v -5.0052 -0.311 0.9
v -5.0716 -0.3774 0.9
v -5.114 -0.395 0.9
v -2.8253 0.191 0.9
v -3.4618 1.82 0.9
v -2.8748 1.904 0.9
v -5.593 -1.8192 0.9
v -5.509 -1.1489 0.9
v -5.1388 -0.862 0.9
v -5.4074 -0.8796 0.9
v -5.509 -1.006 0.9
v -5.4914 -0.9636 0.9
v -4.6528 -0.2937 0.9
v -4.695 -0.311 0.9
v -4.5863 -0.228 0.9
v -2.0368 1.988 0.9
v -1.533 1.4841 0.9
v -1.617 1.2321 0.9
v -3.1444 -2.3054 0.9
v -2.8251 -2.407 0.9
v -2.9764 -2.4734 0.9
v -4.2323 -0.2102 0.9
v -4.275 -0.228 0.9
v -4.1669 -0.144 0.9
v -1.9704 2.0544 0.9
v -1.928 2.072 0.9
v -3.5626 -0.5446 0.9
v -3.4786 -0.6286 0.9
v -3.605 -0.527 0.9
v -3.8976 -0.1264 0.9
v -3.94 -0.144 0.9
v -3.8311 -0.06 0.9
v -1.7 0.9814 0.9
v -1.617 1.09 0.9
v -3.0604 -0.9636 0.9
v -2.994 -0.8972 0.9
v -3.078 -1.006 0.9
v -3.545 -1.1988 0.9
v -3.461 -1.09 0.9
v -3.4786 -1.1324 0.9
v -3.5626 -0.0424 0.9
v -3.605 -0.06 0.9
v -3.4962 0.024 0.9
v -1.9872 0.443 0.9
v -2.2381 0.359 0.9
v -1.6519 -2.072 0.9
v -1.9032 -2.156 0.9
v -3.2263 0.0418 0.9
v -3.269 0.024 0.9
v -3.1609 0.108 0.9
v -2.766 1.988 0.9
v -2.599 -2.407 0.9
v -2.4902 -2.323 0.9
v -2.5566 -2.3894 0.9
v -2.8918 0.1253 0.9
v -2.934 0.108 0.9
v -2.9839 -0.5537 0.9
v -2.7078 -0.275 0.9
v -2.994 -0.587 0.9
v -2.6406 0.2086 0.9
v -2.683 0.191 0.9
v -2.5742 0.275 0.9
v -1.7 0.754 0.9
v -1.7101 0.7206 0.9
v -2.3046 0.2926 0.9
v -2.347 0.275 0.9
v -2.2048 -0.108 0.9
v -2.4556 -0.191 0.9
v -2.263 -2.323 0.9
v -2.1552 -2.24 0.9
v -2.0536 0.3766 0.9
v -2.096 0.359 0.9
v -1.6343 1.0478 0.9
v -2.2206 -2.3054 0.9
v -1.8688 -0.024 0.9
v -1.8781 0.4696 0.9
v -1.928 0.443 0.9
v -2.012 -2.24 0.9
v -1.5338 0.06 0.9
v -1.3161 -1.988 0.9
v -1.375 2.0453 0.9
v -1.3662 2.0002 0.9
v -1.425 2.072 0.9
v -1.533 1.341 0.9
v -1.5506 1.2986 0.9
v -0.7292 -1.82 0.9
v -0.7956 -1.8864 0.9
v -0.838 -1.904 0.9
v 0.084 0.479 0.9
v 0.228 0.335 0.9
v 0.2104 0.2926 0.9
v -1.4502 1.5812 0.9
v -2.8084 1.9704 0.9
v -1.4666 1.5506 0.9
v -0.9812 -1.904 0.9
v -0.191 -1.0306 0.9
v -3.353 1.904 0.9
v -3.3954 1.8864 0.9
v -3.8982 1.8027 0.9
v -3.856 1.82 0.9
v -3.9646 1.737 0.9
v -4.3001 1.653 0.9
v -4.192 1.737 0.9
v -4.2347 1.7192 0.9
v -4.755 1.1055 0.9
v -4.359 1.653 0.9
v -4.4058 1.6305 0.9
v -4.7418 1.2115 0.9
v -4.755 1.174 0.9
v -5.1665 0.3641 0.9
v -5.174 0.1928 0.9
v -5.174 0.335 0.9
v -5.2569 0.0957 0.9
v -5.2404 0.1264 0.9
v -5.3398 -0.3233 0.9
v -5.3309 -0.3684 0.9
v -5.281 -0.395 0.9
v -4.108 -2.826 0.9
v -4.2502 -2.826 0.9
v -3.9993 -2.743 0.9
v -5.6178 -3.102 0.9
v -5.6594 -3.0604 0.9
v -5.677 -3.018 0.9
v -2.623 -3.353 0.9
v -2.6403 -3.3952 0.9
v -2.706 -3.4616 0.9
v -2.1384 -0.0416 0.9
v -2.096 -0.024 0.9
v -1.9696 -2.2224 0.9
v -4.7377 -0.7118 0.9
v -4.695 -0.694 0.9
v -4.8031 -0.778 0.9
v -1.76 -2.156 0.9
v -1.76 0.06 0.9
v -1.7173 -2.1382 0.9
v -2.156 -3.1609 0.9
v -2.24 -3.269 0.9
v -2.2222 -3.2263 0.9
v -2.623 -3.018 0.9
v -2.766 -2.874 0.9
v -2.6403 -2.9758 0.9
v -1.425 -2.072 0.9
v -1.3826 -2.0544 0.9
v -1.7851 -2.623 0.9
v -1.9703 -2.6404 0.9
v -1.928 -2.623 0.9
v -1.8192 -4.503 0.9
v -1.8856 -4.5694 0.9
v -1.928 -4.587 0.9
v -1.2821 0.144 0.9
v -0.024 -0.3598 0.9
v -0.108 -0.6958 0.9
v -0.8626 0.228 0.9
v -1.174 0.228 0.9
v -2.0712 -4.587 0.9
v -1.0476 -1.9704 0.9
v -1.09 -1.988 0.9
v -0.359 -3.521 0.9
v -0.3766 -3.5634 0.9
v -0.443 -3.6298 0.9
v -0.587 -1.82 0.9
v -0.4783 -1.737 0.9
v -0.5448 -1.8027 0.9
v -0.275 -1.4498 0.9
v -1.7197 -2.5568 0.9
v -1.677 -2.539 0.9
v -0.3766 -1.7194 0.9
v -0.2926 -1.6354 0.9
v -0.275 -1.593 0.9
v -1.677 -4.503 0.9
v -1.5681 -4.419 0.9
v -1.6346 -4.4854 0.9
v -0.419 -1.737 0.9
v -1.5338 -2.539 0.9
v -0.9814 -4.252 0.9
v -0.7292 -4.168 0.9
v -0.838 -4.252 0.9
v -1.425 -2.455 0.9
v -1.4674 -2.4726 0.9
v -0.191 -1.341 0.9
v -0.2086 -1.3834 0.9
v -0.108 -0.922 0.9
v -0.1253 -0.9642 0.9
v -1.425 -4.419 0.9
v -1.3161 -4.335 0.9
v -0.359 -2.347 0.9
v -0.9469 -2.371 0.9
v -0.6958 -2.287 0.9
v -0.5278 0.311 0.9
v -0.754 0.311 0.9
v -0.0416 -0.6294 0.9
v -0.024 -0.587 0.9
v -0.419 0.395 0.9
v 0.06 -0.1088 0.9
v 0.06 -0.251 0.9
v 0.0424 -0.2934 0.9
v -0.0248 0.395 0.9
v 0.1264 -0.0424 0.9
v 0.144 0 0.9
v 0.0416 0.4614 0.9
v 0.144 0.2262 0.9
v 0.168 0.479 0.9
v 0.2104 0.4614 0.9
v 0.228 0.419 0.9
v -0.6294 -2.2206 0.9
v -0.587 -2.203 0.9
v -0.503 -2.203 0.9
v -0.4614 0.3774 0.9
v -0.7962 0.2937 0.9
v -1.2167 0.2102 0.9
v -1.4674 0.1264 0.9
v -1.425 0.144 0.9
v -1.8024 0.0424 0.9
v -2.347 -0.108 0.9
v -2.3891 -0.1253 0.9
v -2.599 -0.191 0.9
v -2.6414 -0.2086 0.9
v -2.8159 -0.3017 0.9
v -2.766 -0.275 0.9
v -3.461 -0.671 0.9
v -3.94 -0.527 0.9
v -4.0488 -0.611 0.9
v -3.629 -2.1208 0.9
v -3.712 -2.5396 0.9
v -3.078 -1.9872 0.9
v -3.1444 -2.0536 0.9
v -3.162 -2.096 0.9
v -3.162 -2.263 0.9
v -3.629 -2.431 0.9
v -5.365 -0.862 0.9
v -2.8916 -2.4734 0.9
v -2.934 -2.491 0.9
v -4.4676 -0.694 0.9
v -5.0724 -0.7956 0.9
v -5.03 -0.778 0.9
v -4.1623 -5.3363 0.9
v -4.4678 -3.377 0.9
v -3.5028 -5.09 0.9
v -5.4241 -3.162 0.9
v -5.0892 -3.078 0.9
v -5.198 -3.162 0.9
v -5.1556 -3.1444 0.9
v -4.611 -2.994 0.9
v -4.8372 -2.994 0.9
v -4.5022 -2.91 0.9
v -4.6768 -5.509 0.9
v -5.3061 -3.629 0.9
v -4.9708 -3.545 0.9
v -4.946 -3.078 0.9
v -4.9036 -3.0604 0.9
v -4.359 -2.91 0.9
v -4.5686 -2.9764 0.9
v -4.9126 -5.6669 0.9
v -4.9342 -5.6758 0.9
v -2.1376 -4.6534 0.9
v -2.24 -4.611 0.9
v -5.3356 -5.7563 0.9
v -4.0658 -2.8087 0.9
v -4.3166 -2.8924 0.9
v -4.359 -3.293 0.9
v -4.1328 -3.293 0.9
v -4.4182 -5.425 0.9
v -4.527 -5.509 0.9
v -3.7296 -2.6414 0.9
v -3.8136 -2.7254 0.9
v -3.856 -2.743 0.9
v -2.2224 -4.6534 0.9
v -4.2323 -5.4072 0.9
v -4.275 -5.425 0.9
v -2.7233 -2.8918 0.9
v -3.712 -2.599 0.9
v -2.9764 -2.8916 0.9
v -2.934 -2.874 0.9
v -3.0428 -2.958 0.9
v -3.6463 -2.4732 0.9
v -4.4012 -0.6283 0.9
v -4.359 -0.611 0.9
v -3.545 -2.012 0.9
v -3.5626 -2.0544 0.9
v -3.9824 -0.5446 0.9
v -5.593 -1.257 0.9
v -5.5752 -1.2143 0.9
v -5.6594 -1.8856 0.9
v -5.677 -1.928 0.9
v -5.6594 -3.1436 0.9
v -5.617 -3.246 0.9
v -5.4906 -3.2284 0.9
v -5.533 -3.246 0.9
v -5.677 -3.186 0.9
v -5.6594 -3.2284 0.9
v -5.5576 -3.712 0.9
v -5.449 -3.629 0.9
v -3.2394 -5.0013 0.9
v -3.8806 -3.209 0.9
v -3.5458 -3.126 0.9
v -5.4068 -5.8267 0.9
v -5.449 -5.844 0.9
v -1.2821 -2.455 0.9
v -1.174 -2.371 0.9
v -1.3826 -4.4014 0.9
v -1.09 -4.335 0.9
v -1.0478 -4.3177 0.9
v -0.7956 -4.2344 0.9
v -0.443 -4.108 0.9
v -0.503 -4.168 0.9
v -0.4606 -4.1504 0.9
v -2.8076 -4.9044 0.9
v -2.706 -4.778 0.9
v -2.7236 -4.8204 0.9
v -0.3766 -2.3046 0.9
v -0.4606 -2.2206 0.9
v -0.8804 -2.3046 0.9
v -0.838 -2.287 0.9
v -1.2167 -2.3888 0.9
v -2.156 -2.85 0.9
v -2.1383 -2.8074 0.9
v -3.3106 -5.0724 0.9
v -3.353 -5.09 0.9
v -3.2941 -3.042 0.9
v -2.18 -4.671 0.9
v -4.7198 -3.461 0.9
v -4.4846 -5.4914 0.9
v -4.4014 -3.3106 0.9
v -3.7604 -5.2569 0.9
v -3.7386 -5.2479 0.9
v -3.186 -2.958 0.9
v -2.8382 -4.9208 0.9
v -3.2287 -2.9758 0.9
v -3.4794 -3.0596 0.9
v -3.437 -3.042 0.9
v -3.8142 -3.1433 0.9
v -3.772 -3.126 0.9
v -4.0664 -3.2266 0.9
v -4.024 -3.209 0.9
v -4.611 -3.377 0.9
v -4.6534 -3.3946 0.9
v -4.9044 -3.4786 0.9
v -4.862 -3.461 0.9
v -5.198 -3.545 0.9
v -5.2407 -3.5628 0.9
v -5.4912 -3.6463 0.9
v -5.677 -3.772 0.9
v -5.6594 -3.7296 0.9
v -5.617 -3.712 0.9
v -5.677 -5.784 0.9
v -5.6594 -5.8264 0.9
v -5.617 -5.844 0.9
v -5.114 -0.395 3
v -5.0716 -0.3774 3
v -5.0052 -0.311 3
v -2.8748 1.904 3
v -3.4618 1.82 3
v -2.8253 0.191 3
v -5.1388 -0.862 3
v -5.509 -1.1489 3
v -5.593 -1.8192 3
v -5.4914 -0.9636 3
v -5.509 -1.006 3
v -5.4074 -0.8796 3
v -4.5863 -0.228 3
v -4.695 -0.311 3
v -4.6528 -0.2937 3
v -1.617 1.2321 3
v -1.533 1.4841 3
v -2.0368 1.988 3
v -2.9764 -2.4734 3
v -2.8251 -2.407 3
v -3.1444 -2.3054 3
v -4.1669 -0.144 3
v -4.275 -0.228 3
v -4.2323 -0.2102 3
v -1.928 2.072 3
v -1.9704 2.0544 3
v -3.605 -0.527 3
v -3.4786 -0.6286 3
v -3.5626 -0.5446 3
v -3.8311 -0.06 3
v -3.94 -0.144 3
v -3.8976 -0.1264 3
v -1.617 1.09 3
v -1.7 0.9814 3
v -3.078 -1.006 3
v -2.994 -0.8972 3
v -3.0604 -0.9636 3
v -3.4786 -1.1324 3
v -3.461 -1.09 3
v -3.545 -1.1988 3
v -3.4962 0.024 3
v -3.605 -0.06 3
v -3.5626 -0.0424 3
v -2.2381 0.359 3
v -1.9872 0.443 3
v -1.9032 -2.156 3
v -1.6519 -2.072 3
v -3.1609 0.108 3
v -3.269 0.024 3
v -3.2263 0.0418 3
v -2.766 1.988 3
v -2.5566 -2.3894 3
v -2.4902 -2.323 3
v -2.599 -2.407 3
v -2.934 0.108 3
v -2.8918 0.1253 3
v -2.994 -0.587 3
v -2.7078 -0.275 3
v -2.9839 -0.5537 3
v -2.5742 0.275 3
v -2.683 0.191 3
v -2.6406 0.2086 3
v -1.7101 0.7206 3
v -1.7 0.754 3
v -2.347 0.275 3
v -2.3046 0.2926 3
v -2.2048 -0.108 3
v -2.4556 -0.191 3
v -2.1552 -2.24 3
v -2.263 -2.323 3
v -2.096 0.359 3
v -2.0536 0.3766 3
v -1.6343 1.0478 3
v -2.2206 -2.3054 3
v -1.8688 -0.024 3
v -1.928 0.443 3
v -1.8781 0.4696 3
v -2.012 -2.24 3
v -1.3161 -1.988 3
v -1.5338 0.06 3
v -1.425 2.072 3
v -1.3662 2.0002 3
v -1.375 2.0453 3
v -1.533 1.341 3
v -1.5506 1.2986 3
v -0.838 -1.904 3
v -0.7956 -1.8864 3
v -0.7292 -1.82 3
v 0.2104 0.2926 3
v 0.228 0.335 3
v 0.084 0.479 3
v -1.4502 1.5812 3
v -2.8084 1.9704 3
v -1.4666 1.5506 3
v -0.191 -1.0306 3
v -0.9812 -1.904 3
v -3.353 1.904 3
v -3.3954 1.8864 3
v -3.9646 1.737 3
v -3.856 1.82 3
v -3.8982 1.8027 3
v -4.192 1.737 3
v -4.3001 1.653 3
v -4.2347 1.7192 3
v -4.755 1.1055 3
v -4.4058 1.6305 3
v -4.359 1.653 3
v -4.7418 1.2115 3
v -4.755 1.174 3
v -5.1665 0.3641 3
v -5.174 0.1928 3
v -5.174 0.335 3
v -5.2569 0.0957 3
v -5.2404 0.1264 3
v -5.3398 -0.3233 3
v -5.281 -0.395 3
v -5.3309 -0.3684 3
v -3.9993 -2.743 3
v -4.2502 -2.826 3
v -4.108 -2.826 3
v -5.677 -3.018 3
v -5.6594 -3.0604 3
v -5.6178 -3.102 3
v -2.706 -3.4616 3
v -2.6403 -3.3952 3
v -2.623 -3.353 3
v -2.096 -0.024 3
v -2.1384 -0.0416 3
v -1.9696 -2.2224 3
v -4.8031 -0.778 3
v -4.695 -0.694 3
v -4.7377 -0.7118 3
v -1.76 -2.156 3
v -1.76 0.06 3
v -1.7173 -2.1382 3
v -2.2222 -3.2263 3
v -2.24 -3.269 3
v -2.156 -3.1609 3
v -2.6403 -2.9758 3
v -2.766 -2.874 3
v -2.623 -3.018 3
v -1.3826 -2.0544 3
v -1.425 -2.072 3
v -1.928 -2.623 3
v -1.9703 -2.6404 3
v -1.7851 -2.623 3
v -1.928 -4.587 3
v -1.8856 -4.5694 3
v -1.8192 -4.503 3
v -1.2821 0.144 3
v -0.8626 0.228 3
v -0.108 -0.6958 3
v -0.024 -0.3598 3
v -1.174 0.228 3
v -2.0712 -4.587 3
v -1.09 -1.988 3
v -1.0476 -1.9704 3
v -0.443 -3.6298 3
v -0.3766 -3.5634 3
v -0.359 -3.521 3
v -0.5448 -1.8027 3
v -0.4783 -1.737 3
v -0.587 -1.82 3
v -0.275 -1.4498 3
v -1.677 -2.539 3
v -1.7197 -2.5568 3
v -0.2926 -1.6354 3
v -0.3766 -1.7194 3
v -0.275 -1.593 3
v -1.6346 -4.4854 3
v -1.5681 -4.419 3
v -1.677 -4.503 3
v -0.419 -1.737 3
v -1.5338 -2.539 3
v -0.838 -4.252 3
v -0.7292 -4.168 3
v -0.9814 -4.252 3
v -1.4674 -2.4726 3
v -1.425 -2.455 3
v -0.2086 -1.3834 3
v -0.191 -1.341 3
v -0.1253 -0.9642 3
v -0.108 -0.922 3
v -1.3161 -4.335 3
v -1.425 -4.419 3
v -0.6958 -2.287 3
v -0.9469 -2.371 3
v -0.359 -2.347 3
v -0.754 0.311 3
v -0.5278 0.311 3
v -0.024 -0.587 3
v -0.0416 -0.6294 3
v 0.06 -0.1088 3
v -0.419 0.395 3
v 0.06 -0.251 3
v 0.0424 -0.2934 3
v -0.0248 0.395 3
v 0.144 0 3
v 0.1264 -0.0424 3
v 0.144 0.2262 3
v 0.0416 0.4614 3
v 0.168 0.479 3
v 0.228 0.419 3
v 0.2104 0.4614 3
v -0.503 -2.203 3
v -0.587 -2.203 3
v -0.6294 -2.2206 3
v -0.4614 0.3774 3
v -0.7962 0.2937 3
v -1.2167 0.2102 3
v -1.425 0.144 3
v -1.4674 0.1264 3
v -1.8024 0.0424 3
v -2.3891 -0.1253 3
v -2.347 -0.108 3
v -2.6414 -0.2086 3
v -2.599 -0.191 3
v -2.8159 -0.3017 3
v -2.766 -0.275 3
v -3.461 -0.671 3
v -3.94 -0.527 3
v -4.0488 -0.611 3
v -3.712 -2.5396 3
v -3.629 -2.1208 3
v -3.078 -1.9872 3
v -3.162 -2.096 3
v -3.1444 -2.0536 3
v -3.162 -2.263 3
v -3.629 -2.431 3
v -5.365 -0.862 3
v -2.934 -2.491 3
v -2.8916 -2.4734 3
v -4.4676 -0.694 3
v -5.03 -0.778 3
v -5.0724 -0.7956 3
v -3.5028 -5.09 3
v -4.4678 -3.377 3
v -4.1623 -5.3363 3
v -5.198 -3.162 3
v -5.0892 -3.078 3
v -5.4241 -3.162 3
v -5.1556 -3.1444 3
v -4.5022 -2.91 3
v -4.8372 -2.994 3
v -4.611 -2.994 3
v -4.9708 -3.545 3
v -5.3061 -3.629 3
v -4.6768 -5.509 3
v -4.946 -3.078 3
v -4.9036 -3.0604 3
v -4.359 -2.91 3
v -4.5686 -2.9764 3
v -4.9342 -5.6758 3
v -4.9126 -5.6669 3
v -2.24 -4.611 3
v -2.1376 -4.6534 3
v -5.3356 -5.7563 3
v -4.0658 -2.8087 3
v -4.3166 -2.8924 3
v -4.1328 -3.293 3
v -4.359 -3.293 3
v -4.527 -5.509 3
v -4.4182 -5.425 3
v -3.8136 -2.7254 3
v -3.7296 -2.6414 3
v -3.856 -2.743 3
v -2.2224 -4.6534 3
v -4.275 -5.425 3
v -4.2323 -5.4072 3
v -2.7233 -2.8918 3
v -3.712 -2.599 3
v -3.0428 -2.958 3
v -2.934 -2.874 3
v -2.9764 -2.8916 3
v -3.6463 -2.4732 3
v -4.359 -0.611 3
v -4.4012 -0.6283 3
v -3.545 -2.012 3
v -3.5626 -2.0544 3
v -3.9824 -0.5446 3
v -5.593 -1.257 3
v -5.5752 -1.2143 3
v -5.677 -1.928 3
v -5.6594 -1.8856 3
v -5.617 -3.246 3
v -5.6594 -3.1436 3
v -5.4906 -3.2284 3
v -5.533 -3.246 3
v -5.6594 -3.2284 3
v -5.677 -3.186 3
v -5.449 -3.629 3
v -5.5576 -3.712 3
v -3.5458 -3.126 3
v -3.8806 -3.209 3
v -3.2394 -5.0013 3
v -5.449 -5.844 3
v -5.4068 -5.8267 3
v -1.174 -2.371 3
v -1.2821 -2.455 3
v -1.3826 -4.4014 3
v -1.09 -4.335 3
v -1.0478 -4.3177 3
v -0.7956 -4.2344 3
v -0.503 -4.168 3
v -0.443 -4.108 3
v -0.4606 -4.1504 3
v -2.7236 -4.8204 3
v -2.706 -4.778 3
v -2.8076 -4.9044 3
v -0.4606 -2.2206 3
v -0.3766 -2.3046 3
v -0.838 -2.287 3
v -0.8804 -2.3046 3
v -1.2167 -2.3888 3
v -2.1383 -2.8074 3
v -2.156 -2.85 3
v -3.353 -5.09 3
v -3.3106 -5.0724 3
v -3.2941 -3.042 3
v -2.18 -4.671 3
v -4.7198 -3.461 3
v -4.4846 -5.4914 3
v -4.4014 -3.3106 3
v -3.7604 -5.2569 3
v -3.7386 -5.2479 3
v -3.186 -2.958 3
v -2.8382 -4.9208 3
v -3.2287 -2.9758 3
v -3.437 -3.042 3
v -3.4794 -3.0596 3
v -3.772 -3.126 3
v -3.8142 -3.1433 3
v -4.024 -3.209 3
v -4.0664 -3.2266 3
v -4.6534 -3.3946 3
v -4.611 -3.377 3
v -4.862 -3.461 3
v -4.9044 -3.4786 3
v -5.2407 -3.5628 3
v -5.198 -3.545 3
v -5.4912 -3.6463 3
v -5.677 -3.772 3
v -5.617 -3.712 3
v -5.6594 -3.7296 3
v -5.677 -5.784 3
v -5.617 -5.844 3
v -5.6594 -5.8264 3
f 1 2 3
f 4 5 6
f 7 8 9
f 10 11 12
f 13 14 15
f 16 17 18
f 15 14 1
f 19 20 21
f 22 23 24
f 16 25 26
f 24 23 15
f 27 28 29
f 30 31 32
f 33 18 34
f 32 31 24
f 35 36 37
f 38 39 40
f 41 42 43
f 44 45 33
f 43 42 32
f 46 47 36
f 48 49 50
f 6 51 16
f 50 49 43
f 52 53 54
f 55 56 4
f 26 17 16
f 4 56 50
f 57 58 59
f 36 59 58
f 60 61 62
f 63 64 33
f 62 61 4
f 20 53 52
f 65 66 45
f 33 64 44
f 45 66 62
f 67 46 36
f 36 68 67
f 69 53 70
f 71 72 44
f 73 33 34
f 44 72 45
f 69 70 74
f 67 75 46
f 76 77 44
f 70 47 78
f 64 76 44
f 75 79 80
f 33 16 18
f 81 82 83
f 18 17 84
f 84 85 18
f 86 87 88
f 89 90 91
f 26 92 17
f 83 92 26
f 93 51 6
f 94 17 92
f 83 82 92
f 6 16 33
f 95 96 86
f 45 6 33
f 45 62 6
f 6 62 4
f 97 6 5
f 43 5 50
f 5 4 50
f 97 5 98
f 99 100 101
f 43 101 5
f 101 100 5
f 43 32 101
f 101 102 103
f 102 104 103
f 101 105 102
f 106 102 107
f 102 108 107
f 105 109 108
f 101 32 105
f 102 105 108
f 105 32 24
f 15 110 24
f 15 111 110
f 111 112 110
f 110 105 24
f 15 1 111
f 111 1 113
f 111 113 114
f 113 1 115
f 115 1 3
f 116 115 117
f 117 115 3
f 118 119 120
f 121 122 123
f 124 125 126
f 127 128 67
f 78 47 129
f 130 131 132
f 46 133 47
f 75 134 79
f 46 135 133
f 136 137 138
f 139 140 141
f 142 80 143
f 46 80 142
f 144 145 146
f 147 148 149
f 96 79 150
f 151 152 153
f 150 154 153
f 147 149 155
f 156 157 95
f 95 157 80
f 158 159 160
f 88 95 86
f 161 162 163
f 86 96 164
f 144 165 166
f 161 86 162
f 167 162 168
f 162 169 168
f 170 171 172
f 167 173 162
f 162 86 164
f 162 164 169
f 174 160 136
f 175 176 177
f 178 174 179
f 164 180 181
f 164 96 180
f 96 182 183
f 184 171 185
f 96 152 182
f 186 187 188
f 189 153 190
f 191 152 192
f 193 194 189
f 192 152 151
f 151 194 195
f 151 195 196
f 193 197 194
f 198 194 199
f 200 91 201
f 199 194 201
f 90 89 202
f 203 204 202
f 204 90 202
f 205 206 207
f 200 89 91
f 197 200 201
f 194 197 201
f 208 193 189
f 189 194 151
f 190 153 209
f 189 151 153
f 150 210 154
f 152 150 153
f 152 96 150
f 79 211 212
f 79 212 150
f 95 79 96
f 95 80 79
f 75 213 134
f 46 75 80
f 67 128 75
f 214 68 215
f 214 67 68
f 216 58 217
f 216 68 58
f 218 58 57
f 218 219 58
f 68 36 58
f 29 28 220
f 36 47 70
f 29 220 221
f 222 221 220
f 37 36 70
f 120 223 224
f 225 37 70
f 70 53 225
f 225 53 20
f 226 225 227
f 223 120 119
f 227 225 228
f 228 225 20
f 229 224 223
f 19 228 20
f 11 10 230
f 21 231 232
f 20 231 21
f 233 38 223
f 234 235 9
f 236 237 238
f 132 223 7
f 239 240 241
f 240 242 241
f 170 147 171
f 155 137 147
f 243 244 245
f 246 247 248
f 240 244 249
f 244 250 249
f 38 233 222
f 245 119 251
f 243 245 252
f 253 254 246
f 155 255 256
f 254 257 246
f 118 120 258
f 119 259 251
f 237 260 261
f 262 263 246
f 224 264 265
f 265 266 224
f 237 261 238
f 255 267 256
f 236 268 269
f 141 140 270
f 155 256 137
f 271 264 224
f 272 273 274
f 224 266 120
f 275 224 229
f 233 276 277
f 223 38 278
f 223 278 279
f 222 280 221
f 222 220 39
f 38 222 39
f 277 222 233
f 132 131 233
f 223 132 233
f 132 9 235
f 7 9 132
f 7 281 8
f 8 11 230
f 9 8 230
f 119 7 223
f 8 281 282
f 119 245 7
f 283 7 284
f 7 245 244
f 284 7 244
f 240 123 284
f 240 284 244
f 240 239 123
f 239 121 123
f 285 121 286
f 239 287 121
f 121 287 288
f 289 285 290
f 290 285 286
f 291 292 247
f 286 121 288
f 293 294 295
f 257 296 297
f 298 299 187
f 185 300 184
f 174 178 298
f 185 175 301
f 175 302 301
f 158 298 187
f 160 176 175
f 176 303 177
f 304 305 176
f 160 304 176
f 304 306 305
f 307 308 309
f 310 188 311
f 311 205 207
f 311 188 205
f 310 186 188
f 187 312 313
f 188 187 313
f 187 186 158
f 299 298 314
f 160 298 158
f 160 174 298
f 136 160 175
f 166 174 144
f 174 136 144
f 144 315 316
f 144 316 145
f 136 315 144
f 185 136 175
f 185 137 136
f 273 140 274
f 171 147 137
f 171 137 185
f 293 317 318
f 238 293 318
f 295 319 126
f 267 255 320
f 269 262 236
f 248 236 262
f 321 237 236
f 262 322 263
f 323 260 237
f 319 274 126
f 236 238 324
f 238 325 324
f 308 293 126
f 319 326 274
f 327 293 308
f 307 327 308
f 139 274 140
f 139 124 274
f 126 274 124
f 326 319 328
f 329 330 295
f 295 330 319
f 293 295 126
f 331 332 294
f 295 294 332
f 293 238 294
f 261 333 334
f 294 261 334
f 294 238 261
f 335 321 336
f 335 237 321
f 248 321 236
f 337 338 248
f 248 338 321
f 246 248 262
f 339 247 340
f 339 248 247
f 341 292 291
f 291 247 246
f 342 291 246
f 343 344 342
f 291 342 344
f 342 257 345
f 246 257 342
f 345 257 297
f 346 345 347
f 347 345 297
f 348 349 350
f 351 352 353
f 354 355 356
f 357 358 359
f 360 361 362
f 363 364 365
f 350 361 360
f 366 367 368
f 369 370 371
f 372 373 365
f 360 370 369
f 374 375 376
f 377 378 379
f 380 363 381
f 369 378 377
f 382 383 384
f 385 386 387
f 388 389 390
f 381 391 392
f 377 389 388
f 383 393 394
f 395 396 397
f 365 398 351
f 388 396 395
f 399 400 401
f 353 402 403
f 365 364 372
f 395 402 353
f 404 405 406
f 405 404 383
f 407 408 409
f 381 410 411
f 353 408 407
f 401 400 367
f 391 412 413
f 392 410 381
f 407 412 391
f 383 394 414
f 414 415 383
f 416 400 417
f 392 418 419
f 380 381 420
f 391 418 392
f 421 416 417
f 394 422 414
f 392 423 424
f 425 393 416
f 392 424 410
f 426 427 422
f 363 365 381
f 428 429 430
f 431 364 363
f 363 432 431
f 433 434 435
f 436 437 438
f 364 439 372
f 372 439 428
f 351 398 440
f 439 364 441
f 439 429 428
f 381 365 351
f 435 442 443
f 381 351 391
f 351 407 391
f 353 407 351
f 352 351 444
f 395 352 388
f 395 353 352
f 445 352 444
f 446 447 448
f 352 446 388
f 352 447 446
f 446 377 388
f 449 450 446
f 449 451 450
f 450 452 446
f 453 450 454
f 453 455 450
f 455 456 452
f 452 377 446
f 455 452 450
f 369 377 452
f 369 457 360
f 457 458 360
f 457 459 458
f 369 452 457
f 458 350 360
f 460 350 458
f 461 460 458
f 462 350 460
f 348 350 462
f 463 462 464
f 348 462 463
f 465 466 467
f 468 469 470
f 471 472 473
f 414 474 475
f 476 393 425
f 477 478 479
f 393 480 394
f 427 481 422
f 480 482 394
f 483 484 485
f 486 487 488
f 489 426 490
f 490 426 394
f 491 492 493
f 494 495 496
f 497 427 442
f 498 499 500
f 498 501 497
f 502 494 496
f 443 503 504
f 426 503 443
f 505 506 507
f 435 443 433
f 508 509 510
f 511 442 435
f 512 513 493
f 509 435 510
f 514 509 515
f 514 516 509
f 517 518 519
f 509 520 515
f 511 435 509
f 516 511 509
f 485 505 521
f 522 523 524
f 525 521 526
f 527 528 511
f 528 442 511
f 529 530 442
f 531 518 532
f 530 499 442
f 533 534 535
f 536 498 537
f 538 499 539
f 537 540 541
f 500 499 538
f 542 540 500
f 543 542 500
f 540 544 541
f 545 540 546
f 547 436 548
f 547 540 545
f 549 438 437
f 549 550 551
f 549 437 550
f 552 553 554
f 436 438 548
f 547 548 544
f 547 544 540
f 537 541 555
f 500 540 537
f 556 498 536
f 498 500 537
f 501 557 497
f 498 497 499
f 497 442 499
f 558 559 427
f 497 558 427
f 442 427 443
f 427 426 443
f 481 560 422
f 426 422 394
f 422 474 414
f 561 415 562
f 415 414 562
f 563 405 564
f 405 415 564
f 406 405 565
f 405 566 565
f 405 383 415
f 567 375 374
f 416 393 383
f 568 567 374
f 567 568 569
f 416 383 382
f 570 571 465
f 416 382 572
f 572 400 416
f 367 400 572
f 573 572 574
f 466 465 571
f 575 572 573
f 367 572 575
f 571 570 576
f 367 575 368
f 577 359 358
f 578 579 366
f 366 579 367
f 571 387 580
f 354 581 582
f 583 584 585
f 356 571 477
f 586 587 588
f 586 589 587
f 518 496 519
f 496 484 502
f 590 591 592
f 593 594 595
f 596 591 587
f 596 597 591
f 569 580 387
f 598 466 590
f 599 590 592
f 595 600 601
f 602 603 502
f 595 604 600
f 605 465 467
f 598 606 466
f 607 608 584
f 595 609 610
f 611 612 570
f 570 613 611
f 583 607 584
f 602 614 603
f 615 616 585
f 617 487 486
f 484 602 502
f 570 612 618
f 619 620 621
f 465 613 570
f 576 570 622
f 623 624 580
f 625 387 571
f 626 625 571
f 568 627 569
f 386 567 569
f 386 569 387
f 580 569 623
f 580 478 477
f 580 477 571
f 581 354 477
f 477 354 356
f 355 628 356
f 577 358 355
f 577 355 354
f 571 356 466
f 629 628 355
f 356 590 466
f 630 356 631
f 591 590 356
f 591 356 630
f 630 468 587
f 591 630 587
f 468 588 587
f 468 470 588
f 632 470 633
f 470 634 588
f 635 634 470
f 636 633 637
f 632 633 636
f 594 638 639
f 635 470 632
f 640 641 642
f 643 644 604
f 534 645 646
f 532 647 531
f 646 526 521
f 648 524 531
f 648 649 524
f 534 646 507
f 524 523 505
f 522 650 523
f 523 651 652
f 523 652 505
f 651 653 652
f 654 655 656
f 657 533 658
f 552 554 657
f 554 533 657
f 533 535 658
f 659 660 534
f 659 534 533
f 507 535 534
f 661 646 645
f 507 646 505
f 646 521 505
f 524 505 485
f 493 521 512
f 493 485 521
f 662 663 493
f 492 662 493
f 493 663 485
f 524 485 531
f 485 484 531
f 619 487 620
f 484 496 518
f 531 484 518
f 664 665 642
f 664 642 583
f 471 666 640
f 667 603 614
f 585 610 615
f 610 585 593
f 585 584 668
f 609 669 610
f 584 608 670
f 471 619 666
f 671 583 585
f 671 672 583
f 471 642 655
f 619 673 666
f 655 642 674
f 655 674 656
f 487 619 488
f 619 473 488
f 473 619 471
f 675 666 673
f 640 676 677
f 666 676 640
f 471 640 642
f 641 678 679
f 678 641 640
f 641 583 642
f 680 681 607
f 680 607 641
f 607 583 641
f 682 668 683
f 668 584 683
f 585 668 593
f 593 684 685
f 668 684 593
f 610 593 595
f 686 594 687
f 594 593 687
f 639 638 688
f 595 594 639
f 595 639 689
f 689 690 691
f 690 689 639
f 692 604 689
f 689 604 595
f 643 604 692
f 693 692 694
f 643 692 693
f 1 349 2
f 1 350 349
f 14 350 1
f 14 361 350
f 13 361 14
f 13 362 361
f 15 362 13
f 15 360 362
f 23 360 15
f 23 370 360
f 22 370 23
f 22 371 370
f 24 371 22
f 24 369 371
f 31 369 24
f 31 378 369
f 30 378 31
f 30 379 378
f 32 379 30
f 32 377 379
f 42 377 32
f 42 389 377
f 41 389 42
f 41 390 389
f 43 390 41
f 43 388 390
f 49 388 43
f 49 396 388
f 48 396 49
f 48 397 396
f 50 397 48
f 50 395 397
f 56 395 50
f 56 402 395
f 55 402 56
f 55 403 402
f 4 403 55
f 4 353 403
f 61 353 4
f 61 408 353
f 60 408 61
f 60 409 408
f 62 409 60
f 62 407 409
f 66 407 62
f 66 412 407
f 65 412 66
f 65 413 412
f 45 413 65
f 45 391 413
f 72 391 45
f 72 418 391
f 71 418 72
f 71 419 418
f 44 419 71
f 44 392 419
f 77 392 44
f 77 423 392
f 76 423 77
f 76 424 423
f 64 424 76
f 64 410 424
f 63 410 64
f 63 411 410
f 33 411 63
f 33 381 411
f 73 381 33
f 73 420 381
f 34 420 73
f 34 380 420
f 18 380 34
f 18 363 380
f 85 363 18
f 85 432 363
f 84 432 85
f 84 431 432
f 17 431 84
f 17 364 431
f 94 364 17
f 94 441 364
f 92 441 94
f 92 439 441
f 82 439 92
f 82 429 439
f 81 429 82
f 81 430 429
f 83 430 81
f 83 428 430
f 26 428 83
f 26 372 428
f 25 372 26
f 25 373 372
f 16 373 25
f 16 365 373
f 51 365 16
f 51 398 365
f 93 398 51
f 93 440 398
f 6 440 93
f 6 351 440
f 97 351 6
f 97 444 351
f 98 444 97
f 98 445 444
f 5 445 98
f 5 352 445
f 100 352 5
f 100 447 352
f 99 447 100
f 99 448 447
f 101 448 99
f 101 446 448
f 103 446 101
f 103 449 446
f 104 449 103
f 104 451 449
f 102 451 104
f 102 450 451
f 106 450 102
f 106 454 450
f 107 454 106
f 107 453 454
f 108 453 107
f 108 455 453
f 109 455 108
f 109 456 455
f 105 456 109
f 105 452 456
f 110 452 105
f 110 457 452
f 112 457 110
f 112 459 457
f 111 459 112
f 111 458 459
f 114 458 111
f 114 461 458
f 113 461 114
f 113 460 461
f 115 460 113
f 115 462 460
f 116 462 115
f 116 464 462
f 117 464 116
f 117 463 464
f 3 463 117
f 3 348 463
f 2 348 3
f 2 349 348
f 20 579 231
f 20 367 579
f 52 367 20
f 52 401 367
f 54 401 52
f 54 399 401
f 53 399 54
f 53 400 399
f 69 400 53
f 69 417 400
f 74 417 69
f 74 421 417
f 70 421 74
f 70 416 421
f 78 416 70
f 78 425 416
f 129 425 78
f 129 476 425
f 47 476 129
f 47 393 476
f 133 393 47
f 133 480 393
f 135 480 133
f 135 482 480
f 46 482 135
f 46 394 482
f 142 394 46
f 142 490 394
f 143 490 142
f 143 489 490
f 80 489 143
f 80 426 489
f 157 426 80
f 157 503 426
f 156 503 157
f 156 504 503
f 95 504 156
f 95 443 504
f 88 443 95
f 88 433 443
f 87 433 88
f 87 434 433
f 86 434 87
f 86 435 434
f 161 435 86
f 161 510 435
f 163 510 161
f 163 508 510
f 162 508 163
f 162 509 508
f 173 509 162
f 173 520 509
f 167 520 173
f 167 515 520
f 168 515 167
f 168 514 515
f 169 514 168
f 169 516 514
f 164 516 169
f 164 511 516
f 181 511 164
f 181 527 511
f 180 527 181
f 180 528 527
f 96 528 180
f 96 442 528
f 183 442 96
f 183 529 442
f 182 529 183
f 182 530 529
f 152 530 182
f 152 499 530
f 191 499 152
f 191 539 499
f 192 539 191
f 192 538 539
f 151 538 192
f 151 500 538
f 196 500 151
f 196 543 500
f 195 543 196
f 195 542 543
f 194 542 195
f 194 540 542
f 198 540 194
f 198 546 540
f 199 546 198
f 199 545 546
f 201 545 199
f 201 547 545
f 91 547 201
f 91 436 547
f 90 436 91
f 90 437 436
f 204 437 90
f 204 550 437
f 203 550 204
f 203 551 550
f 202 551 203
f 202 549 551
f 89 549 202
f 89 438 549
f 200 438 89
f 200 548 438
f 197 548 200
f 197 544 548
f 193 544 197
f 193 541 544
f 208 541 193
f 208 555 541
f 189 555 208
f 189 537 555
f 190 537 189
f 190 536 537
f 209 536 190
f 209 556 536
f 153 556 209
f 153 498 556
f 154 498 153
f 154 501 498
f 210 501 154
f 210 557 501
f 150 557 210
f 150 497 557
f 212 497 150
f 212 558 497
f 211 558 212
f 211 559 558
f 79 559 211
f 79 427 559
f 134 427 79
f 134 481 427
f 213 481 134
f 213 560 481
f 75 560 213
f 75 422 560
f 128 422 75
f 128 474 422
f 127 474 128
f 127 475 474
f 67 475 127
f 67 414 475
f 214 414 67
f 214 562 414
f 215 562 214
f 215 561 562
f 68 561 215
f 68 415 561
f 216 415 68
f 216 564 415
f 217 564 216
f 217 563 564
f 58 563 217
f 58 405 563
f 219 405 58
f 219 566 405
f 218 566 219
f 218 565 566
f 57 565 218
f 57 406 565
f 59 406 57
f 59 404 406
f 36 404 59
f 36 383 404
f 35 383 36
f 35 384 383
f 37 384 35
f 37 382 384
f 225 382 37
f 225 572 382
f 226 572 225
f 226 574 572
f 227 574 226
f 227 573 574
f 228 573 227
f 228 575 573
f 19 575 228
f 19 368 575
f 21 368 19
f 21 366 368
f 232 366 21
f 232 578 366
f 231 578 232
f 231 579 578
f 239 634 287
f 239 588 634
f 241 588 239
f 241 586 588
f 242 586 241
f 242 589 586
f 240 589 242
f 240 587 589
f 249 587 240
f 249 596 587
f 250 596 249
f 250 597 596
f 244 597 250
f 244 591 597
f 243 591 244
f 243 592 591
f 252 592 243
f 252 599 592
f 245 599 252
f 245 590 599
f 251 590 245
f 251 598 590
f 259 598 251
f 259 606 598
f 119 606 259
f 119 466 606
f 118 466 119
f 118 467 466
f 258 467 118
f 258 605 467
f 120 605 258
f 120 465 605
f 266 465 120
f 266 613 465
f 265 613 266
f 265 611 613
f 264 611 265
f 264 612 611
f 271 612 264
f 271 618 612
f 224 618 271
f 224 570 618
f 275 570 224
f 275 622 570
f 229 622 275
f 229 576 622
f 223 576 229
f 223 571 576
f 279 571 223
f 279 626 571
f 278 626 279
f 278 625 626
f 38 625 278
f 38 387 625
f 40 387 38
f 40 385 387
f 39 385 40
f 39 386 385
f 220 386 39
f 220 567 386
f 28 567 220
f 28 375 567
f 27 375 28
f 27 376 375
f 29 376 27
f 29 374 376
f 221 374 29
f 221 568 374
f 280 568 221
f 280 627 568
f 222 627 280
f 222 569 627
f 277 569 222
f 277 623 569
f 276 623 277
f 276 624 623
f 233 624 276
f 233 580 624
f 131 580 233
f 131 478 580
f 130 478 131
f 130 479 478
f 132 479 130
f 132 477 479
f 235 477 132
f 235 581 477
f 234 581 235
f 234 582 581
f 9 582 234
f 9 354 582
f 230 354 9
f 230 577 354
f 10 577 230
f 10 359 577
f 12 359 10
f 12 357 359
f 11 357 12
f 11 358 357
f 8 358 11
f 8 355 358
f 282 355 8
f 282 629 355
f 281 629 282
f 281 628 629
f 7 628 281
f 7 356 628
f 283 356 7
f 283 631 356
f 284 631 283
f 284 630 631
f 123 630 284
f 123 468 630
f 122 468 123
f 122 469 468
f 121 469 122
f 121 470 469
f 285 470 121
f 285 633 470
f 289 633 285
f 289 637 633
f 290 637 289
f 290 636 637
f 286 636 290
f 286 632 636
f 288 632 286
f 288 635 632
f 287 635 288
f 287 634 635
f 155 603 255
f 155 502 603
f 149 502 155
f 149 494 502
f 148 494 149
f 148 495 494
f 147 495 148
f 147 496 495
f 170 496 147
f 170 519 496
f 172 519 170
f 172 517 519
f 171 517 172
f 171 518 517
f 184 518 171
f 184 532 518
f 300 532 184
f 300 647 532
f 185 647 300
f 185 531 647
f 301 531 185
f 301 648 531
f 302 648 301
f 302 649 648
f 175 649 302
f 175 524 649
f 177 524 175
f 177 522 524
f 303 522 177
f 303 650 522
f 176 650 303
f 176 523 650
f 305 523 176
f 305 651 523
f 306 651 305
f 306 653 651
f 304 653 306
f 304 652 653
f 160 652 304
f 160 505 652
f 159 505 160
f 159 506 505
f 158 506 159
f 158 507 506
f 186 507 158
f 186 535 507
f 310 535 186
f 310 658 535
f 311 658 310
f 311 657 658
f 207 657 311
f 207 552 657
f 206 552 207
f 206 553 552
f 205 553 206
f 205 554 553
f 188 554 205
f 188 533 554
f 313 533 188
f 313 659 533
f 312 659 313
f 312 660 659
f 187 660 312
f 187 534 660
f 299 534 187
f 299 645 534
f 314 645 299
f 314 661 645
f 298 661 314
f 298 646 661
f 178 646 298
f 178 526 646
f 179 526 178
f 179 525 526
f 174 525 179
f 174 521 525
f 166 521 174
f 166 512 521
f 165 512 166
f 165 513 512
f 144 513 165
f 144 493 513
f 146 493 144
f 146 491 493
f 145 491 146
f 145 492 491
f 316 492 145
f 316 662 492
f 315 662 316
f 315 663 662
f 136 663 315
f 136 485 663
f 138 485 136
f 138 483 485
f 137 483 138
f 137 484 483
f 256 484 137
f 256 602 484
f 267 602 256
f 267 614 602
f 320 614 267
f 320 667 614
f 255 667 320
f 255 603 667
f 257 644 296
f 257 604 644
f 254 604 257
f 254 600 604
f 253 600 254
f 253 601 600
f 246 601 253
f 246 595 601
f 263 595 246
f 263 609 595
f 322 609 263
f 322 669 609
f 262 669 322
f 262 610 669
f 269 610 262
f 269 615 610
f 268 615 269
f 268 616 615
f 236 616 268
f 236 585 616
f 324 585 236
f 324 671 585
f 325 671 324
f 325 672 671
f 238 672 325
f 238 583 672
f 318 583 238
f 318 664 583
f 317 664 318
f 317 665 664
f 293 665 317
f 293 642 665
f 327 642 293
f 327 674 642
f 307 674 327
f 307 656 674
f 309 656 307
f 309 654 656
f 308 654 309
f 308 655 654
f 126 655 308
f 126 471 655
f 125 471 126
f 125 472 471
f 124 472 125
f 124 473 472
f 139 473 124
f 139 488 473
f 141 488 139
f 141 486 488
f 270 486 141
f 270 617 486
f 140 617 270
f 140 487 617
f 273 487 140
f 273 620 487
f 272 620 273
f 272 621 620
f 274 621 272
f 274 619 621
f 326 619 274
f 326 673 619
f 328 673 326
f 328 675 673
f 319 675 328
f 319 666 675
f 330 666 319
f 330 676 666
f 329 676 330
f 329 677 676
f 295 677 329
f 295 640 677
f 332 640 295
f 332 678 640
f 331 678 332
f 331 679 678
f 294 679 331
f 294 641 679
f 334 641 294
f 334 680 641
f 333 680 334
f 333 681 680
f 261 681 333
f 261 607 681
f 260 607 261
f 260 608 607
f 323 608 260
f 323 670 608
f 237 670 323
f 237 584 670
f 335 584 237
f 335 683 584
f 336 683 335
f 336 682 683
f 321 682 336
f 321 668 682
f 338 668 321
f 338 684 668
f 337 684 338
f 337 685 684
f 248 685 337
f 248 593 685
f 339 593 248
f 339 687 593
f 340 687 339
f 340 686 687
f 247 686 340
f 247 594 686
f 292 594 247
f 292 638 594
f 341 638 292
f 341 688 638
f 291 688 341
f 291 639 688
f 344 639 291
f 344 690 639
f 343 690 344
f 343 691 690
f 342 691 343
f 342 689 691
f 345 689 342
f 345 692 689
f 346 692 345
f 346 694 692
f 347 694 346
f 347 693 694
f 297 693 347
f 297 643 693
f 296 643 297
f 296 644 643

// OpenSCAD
$fn = 24;
translate([0, 0.000, 0.900])
  linear_extrude(height=2.100) {
offset(r=0.06, $fn=8) {
    polygon(points=[[-2.683,-3.018],[-2.766,-2.934],[-2.934,-2.934],[-3.018,-3.018],[-3.186,-3.018],[-3.269,-3.102],[-3.437,-3.102],[-3.521,-3.186],[-3.772,-3.186],[-3.856,-3.269],[-4.024,-3.269],[-4.108,-3.353],[-4.359,-3.353],[-4.443,-3.437],[-4.611,-3.437],[-4.695,-3.521],[-4.862,-3.521],[-4.946,-3.605],[-5.198,-3.605],[-5.281,-3.689],[-5.449,-3.689],[-5.533,-3.772],[-5.617,-3.772],[-5.617,-5.784],[-5.449,-5.784],[-5.365,-5.701],[-4.946,-5.617],[-4.695,-5.449],[-4.527,-5.449],[-4.443,-5.365],[-4.275,-5.365],[-4.192,-5.281],[-3.772,-5.198],[-3.521,-5.030],[-3.353,-5.030],[-3.269,-4.946],[-2.850,-4.862],[-2.766,-4.778],[-2.766,-3.437],[-2.683,-3.353]], paths=[[0,1,2,3,4,5,6,7,8,9,10,11,12,13,14,15,16,17,18,19,20,21,22,23,24,25,26,27,28,29,30,31,32,33,34,35,36,37,38,39]]);
    polygon(points=[[-0.503,-2.263],[-0.587,-2.263],[-0.671,-2.347],[-0.838,-2.347],[-0.922,-2.431],[-1.174,-2.431],[-1.257,-2.515],[-1.425,-2.515],[-1.509,-2.599],[-1.677,-2.599],[-1.760,-2.683],[-1.928,-2.683],[-2.096,-2.850],[-2.096,-3.186],[-2.180,-3.269],[-2.180,-4.611],[-2.096,-4.527],[-1.928,-4.527],[-1.844,-4.443],[-1.677,-4.443],[-1.593,-4.359],[-1.425,-4.359],[-1.341,-4.275],[-1.090,-4.275],[-1.006,-4.192],[-0.838,-4.192],[-0.754,-4.108],[-0.503,-4.108],[-0.503,-3.605],[-0.419,-3.521],[-0.419,-2.347]], paths=[[0,1,2,3,4,5,6,7,8,9,10,11,12,13,14,15,16,17,18,19,20,21,22,23,24,25,26,27,28,29,30]]);
    polygon(points=[[-3.605,-0.587],[-3.940,-0.587],[-4.024,-0.671],[-4.359,-0.671],[-4.443,-0.754],[-4.695,-0.754],[-4.778,-0.838],[-5.030,-0.838],[-5.114,-0.922],[-5.365,-0.922],[-5.449,-1.006],[-5.449,-1.174],[-5.533,-1.257],[-5.533,-1.844],[-5.617,-1.928],[-5.617,-3.018],[-5.533,-3.102],[-5.617,-3.186],[-5.533,-3.186],[-5.449,-3.102],[-5.198,-3.102],[-5.114,-3.018],[-4.946,-3.018],[-4.862,-2.934],[-4.611,-2.934],[-4.527,-2.850],[-4.359,-2.850],[-4.275,-2.766],[-4.108,-2.766],[-4.024,-2.683],[-3.856,-2.683],[-3.772,-2.599],[-3.772,-2.515],[-3.689,-2.431],[-3.689,-2.096],[-3.605,-2.012],[-3.605,-1.174],[-3.521,-1.090],[-3.521,-0.671]], paths=[[0,1,2,3,4,5,6,7,8,9,10,11,12,13,14,15,16,17,18,19,20,21,22,23,24,25,26,27,28,29,30,31,32,33,34,35,36,37,38]]);
    polygon(points=[[0.168,0.419],[0.084,0.419],[0.000,0.335],[-0.419,0.335],[-0.503,0.251],[-0.754,0.251],[-0.838,0.168],[-1.174,0.168],[-1.257,0.084],[-1.425,0.084],[-1.509,0.000],[-1.760,0.000],[-1.844,-0.084],[-2.096,-0.084],[-2.180,-0.168],[-2.347,-0.168],[-2.431,-0.251],[-2.599,-0.251],[-2.683,-0.335],[-2.766,-0.335],[-2.934,-0.587],[-2.934,-0.922],[-3.018,-1.006],[-3.018,-2.012],[-3.102,-2.096],[-3.102,-2.263],[-2.934,-2.431],[-2.850,-2.347],[-2.599,-2.347],[-2.515,-2.263],[-2.263,-2.263],[-2.180,-2.180],[-2.012,-2.180],[-1.928,-2.096],[-1.760,-2.096],[-1.677,-2.012],[-1.425,-2.012],[-1.341,-1.928],[-1.090,-1.928],[-1.006,-1.844],[-0.838,-1.844],[-0.754,-1.760],[-0.587,-1.760],[-0.503,-1.677],[-0.419,-1.677],[-0.335,-1.593],[-0.335,-1.425],[-0.251,-1.341],[-0.251,-1.006],[-0.168,-0.922],[-0.168,-0.671],[-0.084,-0.587],[-0.084,-0.335],[0.000,-0.251],[0.000,-0.084],[0.084,0.000],[0.084,0.251],[0.168,0.335]], paths=[[0,1,2,3,4,5,6,7,8,9,10,11,12,13,14,15,16,17,18,19,20,21,22,23,24,25,26,27,28,29,30,31,32,33,34,35,36,37,38,39,40,41,42,43,44,45,46,47,48,49,50,51,52,53,54,55,56,57]]);
    polygon(points=[[-1.425,2.012],[-1.928,2.012],[-2.012,1.928],[-2.766,1.928],[-2.850,1.844],[-3.353,1.844],[-3.437,1.760],[-3.856,1.760],[-3.940,1.677],[-4.192,1.677],[-4.275,1.593],[-4.359,1.593],[-4.695,1.174],[-4.695,1.090],[-5.114,0.335],[-5.114,0.168],[-5.198,0.084],[-5.281,-0.335],[-5.114,-0.335],[-5.030,-0.251],[-4.695,-0.251],[-4.611,-0.168],[-4.275,-0.168],[-4.192,-0.084],[-3.940,-0.084],[-3.856,0.000],[-3.605,0.000],[-3.521,0.084],[-3.269,0.084],[-3.186,0.168],[-2.934,0.168],[-2.850,0.251],[-2.683,0.251],[-2.599,0.335],[-2.347,0.335],[-2.263,0.419],[-2.096,0.419],[-2.012,0.503],[-1.928,0.503],[-1.760,0.754],[-1.760,1.006],[-1.677,1.090],[-1.677,1.257],[-1.593,1.341],[-1.593,1.509],[-1.509,1.593]], paths=[[0,1,2,3,4,5,6,7,8,9,10,11,12,13,14,15,16,17,18,19,20,21,22,23,24,25,26,27,28,29,30,31,32,33,34,35,36,37,38,39,40,41,42,43,44,45]]);
}
}
